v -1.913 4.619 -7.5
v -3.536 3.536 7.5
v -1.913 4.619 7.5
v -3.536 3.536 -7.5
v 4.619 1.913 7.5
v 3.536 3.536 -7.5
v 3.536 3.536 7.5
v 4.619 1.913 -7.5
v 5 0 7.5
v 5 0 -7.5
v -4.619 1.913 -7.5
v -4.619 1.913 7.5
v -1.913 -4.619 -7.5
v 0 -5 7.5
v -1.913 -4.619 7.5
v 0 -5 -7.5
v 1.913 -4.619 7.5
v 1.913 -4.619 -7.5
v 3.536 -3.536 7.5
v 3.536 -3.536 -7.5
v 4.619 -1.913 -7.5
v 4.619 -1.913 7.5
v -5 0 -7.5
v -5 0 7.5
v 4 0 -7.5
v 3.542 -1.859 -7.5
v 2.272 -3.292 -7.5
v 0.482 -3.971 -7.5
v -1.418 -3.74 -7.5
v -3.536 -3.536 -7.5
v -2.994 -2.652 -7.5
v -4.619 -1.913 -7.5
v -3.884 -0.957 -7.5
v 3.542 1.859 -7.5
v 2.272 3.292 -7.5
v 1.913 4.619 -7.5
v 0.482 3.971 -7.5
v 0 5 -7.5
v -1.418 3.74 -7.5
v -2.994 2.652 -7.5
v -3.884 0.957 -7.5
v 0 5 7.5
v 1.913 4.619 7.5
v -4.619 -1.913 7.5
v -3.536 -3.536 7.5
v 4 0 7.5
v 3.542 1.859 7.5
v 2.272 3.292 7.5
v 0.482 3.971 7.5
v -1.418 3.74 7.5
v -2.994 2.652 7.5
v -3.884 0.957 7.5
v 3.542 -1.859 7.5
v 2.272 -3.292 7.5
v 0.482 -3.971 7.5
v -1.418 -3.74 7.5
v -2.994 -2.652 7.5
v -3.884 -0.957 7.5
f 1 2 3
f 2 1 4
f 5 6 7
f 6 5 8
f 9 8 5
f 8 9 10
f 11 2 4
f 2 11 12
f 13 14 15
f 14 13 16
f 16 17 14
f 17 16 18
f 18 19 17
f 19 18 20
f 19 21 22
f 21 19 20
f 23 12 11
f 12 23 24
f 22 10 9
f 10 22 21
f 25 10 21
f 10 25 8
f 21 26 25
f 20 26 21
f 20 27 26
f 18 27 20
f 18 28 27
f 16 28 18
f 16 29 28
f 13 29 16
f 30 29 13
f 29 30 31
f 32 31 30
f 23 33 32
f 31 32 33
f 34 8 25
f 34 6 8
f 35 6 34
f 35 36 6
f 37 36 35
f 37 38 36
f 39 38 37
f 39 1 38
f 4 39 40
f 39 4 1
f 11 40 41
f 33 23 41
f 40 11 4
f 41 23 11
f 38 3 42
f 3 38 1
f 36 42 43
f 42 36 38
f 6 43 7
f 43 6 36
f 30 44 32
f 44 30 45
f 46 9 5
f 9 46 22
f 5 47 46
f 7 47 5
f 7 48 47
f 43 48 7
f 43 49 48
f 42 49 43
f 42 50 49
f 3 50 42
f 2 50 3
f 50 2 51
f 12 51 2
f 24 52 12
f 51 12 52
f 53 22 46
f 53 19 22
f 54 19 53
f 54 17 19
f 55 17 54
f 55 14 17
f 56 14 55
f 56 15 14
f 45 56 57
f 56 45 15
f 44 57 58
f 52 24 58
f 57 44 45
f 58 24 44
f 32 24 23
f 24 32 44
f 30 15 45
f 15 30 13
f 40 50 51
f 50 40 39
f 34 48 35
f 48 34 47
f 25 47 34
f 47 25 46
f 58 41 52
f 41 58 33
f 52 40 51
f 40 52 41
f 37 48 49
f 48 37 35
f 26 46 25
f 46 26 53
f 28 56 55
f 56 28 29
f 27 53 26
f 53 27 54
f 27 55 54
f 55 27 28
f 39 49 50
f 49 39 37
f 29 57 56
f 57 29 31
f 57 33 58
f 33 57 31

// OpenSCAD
// Parameters
length = 15; //[8:30:1]
outer_diameter = 10; //[5:20:0.5]
inner_diameter = 8; //[3:18:0.5]
forced_inner_diameter = 0; //[0:18:0.5]
center = 1; //[0:1:1]
overlap = 1; //[0.5:2:0.1]

// Tubing - complete geometry
module tubing() {
  color([0.85, 0.85, 0.8]) { // PVC-like color
    difference() {
      // Outer tube
      cylinder(r=outer_diameter/2, h=length, center=true);
      // Inner bore
      cylinder(r=((forced_inner_diameter > 0) ? forced_inner_diameter : inner_diameter) / 2, 
               h=length + overlap * 2, center=true);
    }
  }
}

// Assembly
module assembly() {
  translate([0, 0, ((center > 0) ? 0 : length / 2)]) tubing();
}

assembly();
